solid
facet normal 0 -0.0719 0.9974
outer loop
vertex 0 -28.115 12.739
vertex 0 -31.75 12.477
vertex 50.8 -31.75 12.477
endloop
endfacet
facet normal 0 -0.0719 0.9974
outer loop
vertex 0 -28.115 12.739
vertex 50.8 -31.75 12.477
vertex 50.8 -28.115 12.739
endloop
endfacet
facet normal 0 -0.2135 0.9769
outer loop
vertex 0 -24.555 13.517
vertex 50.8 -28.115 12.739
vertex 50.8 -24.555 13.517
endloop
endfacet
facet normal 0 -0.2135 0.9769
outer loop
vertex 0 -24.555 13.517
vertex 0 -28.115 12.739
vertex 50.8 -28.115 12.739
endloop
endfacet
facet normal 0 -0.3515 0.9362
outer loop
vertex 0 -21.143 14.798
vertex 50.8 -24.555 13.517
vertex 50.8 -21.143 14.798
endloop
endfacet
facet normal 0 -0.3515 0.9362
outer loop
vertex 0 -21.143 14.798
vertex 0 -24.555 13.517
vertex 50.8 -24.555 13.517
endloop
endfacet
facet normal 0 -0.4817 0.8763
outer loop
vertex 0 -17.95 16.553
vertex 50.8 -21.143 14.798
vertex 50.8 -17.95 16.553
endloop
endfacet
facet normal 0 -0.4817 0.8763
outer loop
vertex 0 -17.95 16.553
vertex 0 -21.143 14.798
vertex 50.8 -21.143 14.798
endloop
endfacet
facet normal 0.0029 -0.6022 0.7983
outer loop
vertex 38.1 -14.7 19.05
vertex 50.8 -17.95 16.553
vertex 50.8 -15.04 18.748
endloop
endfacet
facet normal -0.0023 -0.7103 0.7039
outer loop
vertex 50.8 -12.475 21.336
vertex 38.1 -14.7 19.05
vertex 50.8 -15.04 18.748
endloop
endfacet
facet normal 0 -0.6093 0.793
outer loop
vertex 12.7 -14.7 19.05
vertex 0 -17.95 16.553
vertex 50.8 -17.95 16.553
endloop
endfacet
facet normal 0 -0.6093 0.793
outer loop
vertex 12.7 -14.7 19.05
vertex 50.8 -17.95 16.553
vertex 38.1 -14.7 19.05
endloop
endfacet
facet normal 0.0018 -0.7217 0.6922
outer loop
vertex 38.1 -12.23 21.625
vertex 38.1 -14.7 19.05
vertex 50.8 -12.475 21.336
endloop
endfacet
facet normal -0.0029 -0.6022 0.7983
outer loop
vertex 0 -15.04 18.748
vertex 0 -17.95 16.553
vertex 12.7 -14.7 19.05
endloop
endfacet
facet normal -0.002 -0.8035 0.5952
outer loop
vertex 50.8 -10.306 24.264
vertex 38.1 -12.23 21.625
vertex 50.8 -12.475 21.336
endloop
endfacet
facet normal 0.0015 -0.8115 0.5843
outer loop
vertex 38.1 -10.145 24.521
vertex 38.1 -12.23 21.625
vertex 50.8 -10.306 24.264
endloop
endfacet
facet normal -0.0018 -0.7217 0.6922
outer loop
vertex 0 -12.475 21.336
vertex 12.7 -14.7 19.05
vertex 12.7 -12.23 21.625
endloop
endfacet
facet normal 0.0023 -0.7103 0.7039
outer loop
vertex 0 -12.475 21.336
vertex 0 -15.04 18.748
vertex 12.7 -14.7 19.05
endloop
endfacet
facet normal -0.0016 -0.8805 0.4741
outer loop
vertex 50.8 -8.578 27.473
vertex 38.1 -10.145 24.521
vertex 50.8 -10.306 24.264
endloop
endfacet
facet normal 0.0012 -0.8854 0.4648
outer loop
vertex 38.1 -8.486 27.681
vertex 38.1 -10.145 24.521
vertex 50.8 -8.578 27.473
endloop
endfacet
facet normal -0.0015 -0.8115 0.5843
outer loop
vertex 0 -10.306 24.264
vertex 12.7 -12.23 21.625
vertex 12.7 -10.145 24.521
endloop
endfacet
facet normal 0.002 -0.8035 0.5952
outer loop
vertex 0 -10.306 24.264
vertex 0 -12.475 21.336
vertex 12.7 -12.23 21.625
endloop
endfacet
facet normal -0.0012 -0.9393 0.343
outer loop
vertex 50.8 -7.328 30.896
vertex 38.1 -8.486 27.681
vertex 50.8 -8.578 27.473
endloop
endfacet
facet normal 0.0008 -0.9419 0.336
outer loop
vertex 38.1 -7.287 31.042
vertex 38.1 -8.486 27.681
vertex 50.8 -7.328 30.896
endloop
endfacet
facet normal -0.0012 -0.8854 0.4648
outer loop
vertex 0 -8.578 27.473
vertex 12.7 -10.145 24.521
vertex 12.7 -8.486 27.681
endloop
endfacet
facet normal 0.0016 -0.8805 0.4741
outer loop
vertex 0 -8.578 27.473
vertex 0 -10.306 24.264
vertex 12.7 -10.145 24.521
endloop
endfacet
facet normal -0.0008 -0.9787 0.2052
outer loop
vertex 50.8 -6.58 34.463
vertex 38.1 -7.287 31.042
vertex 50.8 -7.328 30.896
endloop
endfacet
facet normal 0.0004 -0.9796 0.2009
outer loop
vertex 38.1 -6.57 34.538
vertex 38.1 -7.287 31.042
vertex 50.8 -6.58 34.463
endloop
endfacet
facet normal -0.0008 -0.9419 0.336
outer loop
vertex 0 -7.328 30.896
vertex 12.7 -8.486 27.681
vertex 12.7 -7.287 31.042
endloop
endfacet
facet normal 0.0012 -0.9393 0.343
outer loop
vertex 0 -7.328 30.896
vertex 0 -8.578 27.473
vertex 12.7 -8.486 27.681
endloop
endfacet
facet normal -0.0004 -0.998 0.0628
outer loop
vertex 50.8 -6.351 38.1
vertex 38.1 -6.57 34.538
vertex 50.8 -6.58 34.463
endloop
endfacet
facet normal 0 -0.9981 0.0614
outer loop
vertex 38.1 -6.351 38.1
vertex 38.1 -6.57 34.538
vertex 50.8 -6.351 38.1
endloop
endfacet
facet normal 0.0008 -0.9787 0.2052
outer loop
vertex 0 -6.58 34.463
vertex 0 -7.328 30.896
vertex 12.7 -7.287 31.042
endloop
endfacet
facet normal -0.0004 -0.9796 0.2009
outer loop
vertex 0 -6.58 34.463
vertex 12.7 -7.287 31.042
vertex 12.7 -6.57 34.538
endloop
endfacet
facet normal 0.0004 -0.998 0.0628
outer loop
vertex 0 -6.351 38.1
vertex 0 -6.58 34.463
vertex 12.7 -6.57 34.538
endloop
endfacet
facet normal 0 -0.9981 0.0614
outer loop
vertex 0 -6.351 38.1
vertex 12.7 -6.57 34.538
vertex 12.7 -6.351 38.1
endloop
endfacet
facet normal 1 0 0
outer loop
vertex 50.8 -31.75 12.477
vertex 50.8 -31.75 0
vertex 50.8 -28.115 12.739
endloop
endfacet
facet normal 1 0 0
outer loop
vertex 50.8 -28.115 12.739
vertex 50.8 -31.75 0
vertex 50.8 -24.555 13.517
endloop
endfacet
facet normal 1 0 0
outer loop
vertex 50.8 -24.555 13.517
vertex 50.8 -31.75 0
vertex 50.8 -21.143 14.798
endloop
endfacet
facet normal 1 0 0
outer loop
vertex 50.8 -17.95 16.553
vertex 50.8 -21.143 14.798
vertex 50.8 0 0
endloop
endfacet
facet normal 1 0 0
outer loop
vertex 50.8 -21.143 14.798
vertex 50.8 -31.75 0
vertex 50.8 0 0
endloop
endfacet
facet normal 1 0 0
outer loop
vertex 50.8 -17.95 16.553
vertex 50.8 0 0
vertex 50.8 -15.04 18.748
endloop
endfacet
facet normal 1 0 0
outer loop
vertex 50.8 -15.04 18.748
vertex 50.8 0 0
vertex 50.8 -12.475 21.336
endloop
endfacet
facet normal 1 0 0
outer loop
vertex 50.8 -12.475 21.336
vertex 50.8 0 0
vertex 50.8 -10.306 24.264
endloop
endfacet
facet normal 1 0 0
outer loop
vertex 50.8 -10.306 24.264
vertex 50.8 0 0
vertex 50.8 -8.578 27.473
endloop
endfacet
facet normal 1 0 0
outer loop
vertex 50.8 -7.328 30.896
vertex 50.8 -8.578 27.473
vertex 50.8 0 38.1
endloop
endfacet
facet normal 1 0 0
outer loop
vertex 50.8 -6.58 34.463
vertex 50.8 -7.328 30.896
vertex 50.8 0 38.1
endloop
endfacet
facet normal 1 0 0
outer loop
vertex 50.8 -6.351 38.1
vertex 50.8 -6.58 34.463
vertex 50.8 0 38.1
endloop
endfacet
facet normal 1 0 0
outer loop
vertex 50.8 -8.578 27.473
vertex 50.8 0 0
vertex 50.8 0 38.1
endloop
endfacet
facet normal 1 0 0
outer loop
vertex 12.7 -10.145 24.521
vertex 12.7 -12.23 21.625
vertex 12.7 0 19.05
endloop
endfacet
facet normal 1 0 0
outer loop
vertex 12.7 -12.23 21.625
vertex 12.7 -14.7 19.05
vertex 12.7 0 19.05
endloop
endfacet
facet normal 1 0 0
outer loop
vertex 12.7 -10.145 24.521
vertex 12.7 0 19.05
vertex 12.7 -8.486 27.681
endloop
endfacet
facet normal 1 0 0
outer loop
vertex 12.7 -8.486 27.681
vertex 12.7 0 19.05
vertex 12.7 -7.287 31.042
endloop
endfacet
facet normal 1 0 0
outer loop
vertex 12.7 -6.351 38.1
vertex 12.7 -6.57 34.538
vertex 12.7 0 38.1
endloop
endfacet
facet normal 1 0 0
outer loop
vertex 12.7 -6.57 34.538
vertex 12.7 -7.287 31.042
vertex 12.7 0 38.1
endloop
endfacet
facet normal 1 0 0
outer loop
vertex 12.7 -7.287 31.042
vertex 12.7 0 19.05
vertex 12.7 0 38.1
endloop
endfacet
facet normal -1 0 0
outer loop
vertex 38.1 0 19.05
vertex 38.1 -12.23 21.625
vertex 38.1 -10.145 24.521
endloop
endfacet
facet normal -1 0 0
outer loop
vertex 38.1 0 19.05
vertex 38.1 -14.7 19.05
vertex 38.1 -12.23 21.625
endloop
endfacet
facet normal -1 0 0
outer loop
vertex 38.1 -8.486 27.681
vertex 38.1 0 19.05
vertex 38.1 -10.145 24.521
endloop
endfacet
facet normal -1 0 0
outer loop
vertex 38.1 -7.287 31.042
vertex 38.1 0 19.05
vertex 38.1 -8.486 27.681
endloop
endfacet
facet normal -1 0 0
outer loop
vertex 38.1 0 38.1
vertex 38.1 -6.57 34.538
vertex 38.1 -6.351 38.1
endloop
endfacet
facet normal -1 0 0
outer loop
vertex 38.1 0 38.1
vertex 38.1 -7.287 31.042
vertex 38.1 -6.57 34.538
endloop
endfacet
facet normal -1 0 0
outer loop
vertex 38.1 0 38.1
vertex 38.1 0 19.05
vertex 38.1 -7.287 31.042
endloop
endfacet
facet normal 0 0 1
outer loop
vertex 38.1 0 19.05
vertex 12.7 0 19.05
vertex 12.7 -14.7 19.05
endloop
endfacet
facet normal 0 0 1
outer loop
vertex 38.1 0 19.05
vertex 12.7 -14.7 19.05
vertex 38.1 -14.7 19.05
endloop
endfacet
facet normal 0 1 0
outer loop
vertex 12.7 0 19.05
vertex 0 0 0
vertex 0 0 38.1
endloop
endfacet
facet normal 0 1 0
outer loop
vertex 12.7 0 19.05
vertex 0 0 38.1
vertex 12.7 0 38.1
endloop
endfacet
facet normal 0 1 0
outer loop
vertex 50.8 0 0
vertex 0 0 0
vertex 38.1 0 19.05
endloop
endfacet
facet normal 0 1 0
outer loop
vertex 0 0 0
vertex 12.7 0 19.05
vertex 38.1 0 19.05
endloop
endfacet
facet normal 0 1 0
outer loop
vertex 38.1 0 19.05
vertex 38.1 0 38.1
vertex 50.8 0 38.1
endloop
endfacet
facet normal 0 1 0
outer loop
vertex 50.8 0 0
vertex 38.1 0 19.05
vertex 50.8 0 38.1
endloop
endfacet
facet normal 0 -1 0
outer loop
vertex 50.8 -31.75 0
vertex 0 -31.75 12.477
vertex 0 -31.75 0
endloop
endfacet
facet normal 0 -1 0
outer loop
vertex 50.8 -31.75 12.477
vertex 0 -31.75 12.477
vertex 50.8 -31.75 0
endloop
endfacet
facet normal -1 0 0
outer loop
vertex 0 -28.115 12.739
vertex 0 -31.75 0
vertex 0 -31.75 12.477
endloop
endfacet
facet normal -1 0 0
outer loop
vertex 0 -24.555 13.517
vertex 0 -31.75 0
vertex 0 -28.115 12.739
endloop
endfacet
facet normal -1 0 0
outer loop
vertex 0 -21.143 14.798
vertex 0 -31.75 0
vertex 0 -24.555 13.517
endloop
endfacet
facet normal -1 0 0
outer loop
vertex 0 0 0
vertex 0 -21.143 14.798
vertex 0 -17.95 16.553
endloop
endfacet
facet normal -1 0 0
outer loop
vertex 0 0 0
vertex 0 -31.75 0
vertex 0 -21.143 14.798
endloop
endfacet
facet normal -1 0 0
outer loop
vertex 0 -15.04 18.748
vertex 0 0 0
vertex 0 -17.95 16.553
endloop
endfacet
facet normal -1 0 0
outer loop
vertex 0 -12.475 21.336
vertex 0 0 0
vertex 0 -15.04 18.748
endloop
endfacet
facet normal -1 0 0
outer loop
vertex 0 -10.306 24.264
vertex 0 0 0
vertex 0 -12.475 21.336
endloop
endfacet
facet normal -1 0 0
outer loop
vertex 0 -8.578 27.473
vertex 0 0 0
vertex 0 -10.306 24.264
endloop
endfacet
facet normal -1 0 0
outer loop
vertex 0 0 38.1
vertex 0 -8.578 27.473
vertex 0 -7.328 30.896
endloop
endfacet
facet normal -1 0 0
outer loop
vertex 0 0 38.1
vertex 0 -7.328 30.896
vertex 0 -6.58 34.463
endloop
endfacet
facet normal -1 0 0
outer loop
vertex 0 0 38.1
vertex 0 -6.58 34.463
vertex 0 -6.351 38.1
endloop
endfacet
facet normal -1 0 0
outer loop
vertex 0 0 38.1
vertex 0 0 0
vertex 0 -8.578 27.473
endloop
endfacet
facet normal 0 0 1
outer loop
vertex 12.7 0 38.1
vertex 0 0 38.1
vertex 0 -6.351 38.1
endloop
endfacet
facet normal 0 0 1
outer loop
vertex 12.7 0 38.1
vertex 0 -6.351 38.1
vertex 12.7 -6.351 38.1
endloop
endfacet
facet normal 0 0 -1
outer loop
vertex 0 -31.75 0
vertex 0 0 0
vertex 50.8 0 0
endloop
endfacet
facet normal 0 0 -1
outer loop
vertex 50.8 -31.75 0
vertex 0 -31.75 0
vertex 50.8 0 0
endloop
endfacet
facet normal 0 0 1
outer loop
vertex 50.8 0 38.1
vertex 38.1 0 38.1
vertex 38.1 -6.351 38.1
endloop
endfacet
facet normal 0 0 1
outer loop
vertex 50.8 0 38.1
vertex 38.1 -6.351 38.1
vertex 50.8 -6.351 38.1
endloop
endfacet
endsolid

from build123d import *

# Parameters (mm, degrees)
F0_W     = 50.8
F0_H     = 38.1
F1_DEPTH = 31.75
F2_R     = 25.4
F3_DEPTH = 50.801
F4_W     = 25.4
F4_H     = 19.05
F5_DEPTH = 31.751


with BuildPart() as f1:
    # F0 (on Front) → F1 (new body)
    with BuildSketch(Plane.XZ):
        with Locations((25.4, 19.05)):
            Rectangle(F0_W, F0_H)
    extrude(amount=F1_DEPTH)

    # F2 (on Right) → F3 (cut, through all)
    with BuildSketch(Plane.YZ):
        with Locations((-31.75, 37.877075)):
            Circle(F2_R)
    extrude(amount=F3_DEPTH, mode=Mode.SUBTRACT)

    # F4 (on Front) → F5 (cut, through all)
    with BuildSketch(Plane.XZ):
        with Locations((25.4, 28.575)):
            Rectangle(F4_W, F4_H)
    extrude(amount=F5_DEPTH, mode=Mode.SUBTRACT)


solid = f1.part
